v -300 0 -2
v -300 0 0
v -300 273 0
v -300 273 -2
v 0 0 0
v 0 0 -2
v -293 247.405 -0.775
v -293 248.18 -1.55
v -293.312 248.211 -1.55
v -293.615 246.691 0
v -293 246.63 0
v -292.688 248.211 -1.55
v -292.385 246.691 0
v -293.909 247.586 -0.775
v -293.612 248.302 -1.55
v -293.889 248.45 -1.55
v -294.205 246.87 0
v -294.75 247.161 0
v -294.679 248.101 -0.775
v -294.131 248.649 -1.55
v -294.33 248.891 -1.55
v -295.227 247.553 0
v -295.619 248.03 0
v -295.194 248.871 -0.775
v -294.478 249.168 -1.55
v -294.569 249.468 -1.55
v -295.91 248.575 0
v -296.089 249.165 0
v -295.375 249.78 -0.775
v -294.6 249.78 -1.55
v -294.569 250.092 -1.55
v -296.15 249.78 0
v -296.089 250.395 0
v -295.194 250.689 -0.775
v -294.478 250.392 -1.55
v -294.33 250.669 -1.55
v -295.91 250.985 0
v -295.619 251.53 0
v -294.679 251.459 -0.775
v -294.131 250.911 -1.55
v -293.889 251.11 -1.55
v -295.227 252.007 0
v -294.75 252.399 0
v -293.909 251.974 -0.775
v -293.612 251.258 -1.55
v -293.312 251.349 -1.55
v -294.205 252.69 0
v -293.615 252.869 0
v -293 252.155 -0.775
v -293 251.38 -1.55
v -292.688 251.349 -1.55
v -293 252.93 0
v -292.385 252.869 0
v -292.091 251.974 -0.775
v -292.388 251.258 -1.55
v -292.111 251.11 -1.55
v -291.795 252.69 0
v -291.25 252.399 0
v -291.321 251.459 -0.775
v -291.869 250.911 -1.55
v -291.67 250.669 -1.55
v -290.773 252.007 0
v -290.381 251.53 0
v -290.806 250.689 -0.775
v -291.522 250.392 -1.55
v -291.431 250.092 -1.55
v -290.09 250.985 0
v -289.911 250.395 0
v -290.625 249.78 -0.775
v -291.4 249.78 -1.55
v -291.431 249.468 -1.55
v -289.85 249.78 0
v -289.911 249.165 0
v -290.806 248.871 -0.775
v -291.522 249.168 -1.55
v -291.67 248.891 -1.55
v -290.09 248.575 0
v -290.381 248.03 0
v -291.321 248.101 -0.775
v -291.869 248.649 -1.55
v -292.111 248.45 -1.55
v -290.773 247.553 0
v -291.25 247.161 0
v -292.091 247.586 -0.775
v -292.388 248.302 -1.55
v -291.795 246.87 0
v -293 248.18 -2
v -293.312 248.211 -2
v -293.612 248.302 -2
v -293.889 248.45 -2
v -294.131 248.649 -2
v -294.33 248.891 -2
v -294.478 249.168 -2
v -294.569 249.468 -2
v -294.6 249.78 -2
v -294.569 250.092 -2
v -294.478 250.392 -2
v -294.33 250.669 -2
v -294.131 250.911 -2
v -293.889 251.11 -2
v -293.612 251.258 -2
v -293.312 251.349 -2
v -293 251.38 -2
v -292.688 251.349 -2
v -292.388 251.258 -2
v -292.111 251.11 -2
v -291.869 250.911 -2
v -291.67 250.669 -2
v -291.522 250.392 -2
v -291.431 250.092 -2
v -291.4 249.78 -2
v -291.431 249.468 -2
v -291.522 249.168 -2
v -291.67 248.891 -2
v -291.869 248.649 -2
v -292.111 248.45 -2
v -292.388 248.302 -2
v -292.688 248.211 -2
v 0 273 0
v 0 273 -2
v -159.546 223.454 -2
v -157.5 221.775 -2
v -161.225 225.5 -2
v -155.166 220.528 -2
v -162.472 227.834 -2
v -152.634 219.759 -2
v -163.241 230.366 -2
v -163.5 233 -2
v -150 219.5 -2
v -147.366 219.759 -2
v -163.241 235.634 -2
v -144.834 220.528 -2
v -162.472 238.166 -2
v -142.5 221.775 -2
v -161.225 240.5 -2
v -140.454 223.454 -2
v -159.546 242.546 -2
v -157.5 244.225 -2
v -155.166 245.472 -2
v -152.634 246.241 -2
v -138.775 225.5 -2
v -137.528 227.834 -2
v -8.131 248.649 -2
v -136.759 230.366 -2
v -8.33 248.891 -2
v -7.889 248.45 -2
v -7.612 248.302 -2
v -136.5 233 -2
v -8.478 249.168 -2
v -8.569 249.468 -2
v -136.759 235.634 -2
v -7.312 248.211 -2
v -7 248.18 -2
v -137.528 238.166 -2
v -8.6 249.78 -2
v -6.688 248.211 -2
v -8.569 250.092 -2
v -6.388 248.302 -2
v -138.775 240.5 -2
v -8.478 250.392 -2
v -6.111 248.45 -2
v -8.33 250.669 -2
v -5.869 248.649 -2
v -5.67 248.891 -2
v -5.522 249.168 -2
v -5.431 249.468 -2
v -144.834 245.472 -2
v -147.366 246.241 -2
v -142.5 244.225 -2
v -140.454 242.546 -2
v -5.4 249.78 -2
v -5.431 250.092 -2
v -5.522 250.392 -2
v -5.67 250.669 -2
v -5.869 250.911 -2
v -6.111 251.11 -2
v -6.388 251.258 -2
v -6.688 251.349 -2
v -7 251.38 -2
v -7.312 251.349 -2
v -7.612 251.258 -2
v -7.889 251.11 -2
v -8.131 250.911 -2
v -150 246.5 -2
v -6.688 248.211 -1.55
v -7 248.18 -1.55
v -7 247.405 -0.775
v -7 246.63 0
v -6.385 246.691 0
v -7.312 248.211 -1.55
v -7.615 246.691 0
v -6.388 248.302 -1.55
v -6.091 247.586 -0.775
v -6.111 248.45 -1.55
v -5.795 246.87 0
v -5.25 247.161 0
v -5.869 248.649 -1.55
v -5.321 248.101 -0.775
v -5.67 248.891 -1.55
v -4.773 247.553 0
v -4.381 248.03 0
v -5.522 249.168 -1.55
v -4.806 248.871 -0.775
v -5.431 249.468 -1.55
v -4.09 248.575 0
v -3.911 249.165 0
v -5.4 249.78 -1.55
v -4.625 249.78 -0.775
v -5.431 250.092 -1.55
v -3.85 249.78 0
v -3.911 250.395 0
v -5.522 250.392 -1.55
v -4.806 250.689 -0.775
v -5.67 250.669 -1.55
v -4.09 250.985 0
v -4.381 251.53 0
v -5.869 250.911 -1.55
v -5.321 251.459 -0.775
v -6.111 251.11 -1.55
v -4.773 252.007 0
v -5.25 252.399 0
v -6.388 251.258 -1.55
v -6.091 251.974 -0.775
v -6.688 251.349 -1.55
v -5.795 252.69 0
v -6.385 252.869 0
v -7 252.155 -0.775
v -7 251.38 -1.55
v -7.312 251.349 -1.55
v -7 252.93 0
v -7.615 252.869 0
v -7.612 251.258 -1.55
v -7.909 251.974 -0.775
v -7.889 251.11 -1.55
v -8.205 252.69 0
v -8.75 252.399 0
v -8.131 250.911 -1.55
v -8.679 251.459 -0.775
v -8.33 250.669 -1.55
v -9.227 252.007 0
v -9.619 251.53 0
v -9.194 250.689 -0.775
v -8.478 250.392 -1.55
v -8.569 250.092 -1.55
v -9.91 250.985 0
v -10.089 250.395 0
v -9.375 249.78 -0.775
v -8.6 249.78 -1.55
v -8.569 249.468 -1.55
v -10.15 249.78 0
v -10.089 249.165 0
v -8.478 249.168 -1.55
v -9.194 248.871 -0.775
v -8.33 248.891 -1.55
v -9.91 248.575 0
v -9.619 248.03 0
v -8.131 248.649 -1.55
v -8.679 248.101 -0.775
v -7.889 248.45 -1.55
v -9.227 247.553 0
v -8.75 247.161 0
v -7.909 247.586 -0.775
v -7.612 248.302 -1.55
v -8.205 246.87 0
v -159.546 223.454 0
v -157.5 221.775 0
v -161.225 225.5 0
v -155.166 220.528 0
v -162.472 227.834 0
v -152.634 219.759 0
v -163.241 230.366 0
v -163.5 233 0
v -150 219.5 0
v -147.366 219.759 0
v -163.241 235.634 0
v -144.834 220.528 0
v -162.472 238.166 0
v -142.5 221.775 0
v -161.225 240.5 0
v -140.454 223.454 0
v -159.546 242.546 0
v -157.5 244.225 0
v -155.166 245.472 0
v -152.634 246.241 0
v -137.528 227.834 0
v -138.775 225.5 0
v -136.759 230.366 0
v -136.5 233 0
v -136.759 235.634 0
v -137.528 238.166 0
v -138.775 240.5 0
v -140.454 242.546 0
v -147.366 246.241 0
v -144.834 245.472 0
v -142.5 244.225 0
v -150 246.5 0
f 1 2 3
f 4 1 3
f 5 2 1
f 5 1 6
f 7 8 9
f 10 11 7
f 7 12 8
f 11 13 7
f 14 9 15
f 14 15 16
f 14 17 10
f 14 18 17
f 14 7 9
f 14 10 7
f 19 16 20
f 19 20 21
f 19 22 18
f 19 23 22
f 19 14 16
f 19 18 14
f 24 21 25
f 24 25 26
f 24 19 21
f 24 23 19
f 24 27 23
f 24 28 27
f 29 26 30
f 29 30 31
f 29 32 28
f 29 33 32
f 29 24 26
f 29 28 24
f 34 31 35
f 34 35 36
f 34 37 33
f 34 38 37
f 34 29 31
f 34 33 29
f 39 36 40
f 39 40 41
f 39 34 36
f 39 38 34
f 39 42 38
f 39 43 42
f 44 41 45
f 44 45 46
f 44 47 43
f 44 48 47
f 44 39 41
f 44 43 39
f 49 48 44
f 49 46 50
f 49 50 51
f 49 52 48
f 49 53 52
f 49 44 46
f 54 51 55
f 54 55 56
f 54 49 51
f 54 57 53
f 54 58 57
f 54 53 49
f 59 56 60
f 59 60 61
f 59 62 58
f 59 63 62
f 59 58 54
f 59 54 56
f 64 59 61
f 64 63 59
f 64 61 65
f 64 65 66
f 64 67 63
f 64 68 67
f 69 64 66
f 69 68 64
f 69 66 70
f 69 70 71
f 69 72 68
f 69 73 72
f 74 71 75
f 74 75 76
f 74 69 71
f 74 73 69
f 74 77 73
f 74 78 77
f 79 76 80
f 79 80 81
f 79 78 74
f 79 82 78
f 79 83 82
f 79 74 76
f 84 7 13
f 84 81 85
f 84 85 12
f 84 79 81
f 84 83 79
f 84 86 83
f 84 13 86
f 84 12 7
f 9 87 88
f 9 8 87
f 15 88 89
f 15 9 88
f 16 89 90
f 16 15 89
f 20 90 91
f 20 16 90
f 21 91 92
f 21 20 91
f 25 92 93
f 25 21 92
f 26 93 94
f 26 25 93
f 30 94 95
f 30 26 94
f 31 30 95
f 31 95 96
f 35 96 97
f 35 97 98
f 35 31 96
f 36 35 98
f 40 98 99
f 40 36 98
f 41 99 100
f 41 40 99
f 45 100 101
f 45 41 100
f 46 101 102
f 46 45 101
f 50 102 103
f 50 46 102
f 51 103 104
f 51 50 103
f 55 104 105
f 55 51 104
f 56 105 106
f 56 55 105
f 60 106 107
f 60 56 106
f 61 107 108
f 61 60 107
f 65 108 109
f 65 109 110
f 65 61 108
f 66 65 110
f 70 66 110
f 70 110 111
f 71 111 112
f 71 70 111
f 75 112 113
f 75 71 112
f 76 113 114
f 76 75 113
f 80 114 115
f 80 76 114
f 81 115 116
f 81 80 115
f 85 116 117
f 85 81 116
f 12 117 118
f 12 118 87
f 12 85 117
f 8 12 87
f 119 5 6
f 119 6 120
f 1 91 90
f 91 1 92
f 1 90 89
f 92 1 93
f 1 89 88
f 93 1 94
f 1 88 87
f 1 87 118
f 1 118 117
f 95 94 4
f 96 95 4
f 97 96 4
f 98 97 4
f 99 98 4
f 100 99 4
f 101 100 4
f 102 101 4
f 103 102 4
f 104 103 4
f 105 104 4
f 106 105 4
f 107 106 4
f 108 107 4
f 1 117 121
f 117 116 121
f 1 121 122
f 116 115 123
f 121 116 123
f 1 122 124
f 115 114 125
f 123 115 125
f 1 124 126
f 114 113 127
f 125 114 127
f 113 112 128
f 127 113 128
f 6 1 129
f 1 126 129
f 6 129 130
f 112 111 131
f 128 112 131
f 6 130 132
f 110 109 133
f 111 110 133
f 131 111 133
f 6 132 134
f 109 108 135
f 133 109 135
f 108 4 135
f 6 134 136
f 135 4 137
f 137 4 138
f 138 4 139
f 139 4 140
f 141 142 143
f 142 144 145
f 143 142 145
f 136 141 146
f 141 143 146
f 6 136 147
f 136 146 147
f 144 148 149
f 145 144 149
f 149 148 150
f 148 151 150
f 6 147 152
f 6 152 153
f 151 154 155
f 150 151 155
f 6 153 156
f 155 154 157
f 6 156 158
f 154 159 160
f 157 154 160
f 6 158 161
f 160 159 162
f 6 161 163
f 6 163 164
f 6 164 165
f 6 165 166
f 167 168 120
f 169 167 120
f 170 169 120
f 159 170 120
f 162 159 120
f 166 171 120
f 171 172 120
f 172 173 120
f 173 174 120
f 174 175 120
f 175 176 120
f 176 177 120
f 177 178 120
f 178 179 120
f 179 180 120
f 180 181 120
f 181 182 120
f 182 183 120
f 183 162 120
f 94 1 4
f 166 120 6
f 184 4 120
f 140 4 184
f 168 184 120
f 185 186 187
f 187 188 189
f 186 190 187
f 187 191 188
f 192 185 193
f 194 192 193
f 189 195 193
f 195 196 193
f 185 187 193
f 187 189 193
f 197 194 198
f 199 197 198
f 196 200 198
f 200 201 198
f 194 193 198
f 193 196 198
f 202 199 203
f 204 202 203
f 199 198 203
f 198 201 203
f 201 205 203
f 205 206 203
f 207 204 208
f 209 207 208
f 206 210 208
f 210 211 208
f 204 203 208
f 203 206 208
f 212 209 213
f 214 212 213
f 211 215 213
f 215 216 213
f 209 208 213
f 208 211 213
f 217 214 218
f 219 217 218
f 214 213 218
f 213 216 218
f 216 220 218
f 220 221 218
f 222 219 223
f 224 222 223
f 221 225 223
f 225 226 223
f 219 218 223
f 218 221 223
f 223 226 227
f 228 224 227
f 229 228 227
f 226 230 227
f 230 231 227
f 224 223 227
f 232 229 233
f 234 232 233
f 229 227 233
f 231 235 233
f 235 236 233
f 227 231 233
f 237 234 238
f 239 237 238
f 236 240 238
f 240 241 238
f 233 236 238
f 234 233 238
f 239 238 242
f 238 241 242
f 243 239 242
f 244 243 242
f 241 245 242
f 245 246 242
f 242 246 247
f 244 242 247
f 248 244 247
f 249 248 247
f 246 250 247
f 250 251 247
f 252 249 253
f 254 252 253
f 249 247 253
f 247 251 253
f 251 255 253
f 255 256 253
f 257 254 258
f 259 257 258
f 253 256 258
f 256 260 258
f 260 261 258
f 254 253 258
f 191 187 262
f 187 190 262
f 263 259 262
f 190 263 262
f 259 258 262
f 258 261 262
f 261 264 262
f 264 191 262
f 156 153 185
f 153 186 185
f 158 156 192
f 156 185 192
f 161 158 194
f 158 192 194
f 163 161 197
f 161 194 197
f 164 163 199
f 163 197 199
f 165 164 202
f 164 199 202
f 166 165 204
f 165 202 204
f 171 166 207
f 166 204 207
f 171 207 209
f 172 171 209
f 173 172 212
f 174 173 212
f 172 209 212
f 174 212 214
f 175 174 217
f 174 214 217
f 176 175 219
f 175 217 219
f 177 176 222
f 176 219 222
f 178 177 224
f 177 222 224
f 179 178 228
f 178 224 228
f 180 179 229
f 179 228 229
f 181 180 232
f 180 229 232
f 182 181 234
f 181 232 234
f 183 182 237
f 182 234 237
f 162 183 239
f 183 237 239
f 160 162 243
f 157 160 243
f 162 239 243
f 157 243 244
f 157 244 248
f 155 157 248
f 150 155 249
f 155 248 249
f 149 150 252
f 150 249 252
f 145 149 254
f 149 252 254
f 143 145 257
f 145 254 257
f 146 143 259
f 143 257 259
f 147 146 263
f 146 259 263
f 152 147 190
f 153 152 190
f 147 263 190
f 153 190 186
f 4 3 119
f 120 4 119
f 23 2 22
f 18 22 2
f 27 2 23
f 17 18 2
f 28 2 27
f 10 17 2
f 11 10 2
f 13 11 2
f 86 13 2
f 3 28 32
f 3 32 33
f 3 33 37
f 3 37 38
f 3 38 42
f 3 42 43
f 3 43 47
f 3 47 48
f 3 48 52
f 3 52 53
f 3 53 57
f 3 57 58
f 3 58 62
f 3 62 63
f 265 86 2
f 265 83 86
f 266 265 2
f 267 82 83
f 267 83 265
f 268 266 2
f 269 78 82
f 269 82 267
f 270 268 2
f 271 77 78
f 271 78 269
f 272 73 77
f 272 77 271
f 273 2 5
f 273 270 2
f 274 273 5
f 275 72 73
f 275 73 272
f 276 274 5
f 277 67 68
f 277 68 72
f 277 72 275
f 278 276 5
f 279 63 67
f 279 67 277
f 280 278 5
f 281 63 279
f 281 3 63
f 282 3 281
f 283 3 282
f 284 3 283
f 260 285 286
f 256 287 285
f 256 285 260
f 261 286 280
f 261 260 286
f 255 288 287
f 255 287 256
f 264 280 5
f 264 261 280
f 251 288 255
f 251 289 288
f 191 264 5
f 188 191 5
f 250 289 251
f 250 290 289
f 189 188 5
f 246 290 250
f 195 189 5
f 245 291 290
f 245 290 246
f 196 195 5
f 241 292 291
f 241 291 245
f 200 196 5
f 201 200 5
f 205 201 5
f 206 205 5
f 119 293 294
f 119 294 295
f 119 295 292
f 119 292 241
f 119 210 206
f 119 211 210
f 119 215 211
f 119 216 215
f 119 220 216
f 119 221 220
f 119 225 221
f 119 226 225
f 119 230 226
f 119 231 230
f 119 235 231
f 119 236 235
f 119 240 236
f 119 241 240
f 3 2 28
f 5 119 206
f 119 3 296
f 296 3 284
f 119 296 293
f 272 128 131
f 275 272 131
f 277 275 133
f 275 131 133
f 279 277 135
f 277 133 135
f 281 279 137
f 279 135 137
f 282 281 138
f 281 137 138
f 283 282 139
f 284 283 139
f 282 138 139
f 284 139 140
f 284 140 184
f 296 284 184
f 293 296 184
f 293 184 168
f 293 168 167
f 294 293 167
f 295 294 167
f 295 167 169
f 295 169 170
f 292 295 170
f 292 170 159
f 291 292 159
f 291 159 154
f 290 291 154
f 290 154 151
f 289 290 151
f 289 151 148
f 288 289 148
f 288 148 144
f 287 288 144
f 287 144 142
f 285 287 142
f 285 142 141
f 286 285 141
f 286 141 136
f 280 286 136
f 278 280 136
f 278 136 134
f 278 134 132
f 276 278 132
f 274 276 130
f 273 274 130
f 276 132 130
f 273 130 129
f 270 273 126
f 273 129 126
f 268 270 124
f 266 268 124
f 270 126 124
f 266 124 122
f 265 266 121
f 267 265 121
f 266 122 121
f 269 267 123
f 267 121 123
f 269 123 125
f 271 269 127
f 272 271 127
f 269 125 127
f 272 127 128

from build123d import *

# Parameters (mm, degrees)
SKETCH1_W             = 300
SKETCH1_H             = 273
BASE_FLANGE1_DEPTH    = 2
M25_CLEARANCE_HOLE1_D = 27


# Sheet-metal steps are written as plain solids
with BuildPart() as part:
    # Sketch1 → Base-Flange1 (new body)
    with BuildSketch(Plane.XY):
        with Locations((-150, 136.5)):
            Rectangle(SKETCH1_W, SKETCH1_H)
    extrude(amount=-BASE_FLANGE1_DEPTH)

    # Sketch8 → CSK for M3 Oval Head Machine Screw1 (revolve, cut)
    with BuildSketch(Plane(origin=(-293, 249.78, 0), x_dir=(0, -1, 0), z_dir=(1, 0, 0))):
        Polygon((0, 0), (0, 2), (1.6, 2), (1.6, 1.55), (3.15, 0), align=None)
    csk_for_m3_oval_head_machine_screw1 = revolve(axis=Axis((-293, 249.78, 6.35), (0, 0, -1)), mode=Mode.SUBTRACT)

    # Mirror1: CSK for M3 Oval Head Machine Screw1 across plane
    add(csk_for_m3_oval_head_machine_screw1.mirror(Plane.ZY.offset(150)), mode=Mode.SUBTRACT)

    # M25 Clearance Hole1 (through all)
    with Locations(Plane.XY):
        with Locations((-150, 233)):
            Hole(M25_CLEARANCE_HOLE1_D / 2)


solid = part.part
